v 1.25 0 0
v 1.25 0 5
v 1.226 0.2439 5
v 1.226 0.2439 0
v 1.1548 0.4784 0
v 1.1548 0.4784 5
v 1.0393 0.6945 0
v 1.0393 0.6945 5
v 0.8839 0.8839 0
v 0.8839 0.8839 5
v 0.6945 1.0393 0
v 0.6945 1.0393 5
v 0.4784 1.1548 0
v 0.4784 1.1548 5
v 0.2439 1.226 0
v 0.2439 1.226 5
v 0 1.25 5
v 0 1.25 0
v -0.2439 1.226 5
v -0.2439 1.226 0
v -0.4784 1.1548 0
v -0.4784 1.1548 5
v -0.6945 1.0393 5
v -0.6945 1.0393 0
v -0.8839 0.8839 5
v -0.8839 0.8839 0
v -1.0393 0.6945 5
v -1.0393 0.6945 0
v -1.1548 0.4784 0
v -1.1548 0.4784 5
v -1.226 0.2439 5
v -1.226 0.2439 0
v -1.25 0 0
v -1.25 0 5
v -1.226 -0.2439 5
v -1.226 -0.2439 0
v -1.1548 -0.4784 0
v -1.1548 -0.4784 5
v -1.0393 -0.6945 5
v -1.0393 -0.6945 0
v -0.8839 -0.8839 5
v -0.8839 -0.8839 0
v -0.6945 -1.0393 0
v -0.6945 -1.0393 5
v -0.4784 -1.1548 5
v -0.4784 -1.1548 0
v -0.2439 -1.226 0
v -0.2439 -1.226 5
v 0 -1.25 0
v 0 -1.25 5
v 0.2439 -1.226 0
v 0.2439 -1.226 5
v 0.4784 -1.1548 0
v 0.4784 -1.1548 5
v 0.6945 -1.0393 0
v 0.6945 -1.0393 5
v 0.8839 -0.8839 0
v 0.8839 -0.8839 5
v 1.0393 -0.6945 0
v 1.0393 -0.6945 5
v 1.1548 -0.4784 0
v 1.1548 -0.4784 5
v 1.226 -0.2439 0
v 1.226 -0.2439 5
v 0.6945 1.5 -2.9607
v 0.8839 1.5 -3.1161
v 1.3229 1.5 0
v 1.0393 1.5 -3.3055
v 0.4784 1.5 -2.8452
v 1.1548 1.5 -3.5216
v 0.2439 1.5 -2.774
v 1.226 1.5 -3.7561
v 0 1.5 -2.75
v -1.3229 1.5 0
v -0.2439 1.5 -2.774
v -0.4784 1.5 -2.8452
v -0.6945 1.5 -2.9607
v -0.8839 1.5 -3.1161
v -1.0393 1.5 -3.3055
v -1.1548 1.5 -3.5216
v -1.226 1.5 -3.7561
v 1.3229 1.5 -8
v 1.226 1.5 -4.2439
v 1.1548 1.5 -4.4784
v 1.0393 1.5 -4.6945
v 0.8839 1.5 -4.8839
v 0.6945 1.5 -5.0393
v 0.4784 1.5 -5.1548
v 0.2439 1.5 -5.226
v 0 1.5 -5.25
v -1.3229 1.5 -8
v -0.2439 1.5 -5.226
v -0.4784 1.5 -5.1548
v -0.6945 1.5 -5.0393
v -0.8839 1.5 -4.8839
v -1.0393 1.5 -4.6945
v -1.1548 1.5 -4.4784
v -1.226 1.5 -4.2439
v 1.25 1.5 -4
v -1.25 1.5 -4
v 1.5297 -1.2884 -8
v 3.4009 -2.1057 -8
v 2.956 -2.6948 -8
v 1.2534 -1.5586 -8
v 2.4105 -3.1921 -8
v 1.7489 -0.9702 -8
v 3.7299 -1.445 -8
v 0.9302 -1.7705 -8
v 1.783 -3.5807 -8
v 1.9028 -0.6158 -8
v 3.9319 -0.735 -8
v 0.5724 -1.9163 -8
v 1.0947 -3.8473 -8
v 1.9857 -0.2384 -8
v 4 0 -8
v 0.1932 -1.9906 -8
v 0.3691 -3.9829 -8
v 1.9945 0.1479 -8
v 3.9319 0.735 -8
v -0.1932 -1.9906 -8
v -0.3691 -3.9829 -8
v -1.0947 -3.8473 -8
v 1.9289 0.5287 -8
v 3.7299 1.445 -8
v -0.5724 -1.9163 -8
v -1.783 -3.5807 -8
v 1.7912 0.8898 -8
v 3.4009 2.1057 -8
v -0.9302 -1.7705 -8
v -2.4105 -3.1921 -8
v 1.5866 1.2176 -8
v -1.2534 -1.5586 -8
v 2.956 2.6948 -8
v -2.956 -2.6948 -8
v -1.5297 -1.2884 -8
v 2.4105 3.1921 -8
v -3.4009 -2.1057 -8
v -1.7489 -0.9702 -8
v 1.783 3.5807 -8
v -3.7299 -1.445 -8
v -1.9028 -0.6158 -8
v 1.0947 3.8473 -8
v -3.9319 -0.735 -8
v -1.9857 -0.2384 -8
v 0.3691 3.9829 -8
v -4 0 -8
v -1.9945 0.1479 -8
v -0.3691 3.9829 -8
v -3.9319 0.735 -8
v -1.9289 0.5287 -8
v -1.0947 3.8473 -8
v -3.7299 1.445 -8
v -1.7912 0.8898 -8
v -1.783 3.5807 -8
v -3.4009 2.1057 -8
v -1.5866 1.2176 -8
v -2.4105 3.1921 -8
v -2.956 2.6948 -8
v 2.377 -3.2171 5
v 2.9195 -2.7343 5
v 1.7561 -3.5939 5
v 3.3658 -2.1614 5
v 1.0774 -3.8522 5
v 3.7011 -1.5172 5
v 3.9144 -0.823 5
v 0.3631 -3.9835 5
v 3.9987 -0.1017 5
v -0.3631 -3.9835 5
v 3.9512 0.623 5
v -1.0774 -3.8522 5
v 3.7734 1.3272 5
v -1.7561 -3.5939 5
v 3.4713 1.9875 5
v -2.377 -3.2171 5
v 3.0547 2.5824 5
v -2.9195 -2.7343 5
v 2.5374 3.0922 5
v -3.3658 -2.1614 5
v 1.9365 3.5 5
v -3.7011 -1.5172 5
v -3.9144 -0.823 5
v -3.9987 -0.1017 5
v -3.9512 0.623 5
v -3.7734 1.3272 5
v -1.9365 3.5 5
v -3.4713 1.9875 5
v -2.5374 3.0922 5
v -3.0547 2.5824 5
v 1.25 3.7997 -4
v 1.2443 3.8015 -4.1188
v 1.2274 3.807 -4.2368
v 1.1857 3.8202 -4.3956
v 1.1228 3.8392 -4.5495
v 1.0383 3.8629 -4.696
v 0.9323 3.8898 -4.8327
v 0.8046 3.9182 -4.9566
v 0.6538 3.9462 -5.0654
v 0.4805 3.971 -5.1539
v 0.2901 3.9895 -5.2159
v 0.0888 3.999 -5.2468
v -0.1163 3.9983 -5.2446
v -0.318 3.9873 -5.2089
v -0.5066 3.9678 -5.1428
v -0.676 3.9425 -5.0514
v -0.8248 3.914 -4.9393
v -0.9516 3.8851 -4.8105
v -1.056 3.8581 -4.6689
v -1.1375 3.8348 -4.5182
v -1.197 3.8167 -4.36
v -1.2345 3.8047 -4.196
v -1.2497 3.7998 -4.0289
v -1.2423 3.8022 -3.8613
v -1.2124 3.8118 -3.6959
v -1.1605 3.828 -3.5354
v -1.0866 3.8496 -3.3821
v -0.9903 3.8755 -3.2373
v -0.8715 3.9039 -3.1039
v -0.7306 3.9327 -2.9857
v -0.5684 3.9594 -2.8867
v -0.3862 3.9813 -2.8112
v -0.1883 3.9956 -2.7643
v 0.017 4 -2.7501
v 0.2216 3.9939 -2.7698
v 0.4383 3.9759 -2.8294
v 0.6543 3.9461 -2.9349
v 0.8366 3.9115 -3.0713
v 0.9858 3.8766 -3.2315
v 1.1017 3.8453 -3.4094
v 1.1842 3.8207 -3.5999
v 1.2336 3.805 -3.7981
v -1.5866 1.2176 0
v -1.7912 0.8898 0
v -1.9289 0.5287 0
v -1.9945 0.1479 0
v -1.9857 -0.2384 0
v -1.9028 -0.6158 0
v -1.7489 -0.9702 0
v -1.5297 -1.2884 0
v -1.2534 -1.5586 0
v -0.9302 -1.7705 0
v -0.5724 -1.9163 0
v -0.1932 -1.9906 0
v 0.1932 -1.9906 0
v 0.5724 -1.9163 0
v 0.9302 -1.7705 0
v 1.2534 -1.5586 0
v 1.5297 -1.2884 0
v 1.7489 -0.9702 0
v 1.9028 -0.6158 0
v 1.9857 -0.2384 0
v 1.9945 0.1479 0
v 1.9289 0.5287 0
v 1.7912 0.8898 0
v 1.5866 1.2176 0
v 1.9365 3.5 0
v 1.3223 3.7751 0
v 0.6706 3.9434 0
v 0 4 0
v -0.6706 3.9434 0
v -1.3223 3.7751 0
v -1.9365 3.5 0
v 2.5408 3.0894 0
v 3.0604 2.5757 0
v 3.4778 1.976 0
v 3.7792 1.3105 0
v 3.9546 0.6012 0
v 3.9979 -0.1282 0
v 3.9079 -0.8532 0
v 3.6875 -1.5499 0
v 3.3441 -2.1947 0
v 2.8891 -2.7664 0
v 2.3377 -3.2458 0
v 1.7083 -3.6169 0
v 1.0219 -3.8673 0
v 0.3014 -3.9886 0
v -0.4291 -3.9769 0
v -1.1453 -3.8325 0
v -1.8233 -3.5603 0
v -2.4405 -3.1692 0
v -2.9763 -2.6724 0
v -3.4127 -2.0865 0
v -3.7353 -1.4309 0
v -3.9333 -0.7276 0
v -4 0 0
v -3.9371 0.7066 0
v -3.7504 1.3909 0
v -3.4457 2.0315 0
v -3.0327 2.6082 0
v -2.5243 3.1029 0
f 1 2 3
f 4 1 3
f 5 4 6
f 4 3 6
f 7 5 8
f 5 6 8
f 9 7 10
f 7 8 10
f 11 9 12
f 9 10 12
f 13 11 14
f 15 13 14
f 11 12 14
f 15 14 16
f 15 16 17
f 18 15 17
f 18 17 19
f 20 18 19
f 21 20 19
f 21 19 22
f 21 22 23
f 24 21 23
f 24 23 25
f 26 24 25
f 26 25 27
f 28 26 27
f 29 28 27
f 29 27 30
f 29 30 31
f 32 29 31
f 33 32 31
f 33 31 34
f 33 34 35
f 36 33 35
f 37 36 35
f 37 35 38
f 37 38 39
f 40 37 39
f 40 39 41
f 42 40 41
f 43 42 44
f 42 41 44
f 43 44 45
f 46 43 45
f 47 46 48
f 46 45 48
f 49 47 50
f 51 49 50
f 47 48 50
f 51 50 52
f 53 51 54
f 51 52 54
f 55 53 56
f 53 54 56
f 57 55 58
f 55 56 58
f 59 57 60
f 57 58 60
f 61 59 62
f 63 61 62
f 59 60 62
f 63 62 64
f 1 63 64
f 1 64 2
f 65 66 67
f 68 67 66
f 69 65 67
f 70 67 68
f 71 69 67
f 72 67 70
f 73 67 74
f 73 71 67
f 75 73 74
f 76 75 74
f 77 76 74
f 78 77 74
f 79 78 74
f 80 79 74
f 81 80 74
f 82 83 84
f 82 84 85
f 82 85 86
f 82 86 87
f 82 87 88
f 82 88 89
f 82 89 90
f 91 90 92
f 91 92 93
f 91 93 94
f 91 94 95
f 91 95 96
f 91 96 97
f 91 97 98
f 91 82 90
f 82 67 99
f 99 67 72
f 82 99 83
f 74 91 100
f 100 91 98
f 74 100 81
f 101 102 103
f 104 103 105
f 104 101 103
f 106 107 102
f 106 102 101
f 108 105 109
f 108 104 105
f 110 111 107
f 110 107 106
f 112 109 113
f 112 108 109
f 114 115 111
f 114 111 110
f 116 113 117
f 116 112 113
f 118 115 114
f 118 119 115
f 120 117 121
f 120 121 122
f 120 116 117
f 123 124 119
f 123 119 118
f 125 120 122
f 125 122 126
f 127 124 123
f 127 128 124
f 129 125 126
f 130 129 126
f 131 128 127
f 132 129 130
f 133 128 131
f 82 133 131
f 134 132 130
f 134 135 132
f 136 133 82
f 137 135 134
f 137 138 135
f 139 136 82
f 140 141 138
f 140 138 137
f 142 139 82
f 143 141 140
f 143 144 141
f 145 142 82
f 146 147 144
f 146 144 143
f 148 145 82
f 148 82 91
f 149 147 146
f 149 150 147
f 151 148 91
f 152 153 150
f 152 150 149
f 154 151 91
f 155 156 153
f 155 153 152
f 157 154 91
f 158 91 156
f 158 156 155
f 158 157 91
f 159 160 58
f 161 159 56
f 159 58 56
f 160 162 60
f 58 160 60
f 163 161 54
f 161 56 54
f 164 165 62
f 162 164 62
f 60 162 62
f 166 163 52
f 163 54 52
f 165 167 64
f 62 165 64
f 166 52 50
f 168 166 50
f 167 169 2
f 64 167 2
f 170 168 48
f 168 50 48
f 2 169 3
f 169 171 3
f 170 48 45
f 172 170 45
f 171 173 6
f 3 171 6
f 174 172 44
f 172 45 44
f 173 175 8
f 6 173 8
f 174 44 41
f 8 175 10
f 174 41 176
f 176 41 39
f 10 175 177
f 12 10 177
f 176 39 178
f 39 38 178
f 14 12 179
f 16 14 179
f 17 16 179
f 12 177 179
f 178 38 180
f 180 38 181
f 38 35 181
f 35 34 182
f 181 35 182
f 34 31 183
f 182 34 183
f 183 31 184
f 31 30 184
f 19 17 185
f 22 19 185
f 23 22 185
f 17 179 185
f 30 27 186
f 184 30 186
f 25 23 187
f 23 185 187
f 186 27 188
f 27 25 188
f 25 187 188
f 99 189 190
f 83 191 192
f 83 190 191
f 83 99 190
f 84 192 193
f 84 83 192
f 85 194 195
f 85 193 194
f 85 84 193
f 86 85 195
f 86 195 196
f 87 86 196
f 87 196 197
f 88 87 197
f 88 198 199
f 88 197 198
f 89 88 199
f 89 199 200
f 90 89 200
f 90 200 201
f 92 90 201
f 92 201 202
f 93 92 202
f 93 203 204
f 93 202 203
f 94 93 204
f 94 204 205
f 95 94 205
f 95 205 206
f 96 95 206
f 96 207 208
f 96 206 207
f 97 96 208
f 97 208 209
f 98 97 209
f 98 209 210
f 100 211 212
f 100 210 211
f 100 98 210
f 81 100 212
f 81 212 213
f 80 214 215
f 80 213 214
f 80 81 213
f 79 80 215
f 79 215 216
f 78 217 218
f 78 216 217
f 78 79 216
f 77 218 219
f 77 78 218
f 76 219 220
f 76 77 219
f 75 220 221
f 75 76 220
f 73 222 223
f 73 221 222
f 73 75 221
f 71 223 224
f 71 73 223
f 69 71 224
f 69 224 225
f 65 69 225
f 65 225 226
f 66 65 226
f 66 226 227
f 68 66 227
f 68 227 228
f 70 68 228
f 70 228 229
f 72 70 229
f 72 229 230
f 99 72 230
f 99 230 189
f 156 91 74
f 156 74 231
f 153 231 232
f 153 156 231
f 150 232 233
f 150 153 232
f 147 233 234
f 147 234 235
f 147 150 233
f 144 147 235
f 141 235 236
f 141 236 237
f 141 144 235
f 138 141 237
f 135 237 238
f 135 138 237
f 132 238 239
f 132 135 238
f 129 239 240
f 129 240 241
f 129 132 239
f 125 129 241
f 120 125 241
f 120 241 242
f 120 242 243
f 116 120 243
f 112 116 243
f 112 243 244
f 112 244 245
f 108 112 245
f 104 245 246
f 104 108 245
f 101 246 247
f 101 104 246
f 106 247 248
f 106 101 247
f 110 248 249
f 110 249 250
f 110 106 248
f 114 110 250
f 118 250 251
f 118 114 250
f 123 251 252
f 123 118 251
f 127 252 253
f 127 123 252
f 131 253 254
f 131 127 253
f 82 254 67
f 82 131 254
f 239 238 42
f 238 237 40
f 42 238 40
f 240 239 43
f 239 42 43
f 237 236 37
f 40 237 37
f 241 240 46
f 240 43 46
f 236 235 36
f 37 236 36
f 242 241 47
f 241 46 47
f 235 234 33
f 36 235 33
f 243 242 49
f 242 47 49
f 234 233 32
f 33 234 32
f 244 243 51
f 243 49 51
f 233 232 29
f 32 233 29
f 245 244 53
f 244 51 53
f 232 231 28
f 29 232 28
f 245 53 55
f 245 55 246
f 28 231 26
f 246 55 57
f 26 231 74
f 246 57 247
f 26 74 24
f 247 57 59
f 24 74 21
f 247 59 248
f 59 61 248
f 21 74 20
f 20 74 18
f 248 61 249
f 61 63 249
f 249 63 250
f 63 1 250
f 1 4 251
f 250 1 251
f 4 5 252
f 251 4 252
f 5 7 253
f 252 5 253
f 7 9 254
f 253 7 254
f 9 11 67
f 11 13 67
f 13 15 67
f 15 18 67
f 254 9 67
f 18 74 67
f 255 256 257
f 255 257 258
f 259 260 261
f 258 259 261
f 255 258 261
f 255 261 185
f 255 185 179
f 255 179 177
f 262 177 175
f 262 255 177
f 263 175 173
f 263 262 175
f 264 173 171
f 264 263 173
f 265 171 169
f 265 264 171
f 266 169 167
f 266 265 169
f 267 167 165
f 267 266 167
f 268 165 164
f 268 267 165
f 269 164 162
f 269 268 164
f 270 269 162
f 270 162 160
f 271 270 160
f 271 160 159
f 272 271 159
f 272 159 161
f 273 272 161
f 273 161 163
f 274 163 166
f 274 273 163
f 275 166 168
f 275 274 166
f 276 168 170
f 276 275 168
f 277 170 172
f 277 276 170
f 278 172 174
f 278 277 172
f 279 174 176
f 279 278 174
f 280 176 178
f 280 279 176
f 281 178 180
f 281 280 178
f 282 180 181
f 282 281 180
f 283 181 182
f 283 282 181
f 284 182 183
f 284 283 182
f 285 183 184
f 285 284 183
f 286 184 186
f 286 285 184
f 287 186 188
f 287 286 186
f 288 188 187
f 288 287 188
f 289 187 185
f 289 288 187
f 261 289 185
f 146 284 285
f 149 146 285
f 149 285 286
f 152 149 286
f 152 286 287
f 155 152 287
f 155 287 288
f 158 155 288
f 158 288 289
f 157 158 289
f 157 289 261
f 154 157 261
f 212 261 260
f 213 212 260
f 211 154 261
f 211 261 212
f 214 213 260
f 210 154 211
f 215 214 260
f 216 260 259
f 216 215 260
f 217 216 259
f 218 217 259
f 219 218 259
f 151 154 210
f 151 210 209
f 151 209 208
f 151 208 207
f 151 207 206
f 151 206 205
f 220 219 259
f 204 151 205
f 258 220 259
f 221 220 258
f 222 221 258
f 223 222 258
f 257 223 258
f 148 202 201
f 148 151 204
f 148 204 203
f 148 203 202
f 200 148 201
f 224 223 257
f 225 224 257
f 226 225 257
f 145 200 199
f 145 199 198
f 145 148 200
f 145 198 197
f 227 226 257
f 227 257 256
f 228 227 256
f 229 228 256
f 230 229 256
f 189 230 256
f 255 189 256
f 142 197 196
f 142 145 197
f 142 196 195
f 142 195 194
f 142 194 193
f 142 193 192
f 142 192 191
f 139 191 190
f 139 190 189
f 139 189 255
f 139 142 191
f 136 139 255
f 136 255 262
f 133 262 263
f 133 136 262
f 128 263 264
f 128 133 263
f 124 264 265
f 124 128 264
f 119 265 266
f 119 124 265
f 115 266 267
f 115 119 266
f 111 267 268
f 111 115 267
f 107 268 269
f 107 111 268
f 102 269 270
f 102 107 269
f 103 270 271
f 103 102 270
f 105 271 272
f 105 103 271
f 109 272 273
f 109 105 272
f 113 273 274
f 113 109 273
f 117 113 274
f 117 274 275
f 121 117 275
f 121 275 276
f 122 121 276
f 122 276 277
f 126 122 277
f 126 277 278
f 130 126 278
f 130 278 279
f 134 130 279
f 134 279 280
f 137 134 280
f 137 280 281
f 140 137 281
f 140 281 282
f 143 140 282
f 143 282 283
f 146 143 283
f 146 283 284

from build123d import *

# Parameters (mm, degrees)
BOSS_EXTRUDE1_DEPTH    = 5
BOSS_EXTRUDE2_START    = 8
SKETCH2_R              = 4
BOSS_EXTRUDE2_DEPTH    = 8
CUT_EXTRUDE1_DEPTH     = 8
SKETCH4_R              = 1.25
CUT_EXTRUDE2_DEPTH     = 8
CUT_EXTRUDE3_START     = -2.5
CUT_EXTRUDE3_OUTLINE_R = 1.25
CUT_EXTRUDE3_DEPTH     = 2.5


# Read off the part's stored shape, not the designer's step: Cut-Extrude3
with BuildPart() as part:
    # Sketch1 → Boss-Extrude1 (new body)
    with BuildSketch(Plane.XY):
        with BuildLine():
            Line((-1.936491673, 3.5), (1.936491673, 3.5))
            ThreePointArc((1.936491673, 3.5), (0, -4), (-1.936491673, 3.5))
        make_face()
    extrude(amount=BOSS_EXTRUDE1_DEPTH)

    # Sketch2 → Boss-Extrude2 (add)
    with BuildSketch(Plane(origin=(0, 0, 0), x_dir=(-1, 0, 0), z_dir=(0, 0, -1)).offset(BOSS_EXTRUDE2_START)):
        Circle(SKETCH2_R)
    extrude(amount=-BOSS_EXTRUDE2_DEPTH)

    # Sketch3 → Cut-Extrude1 (cut)
    with BuildSketch(Plane(origin=(0, 0, -8), x_dir=(-1, 0, 0), z_dir=(0, 0, -1))):
        with BuildLine():
            Line((-1.322875656, 1.5), (1.322875656, 1.5))
            ThreePointArc((1.322875656, 1.5), (0, -2), (-1.322875656, 1.5))
        make_face()
    extrude(amount=-CUT_EXTRUDE1_DEPTH, mode=Mode.SUBTRACT)

    # Sketch4 → Cut-Extrude2 (cut)
    with BuildSketch(Plane.XY.offset(5)):
        Circle(SKETCH4_R)
    extrude(amount=-CUT_EXTRUDE2_DEPTH, mode=Mode.SUBTRACT)

    # Cut-Extrude3 outline → Cut-Extrude3 (cut)
    with BuildSketch(Plane(origin=(0, 4, 0), x_dir=(1, 0, 0), z_dir=(0, 1, 0)).offset(CUT_EXTRUDE3_START)):
        with Locations((0, 4)):
            Circle(CUT_EXTRUDE3_OUTLINE_R)
    extrude(amount=CUT_EXTRUDE3_DEPTH, mode=Mode.SUBTRACT)


solid = part.part
